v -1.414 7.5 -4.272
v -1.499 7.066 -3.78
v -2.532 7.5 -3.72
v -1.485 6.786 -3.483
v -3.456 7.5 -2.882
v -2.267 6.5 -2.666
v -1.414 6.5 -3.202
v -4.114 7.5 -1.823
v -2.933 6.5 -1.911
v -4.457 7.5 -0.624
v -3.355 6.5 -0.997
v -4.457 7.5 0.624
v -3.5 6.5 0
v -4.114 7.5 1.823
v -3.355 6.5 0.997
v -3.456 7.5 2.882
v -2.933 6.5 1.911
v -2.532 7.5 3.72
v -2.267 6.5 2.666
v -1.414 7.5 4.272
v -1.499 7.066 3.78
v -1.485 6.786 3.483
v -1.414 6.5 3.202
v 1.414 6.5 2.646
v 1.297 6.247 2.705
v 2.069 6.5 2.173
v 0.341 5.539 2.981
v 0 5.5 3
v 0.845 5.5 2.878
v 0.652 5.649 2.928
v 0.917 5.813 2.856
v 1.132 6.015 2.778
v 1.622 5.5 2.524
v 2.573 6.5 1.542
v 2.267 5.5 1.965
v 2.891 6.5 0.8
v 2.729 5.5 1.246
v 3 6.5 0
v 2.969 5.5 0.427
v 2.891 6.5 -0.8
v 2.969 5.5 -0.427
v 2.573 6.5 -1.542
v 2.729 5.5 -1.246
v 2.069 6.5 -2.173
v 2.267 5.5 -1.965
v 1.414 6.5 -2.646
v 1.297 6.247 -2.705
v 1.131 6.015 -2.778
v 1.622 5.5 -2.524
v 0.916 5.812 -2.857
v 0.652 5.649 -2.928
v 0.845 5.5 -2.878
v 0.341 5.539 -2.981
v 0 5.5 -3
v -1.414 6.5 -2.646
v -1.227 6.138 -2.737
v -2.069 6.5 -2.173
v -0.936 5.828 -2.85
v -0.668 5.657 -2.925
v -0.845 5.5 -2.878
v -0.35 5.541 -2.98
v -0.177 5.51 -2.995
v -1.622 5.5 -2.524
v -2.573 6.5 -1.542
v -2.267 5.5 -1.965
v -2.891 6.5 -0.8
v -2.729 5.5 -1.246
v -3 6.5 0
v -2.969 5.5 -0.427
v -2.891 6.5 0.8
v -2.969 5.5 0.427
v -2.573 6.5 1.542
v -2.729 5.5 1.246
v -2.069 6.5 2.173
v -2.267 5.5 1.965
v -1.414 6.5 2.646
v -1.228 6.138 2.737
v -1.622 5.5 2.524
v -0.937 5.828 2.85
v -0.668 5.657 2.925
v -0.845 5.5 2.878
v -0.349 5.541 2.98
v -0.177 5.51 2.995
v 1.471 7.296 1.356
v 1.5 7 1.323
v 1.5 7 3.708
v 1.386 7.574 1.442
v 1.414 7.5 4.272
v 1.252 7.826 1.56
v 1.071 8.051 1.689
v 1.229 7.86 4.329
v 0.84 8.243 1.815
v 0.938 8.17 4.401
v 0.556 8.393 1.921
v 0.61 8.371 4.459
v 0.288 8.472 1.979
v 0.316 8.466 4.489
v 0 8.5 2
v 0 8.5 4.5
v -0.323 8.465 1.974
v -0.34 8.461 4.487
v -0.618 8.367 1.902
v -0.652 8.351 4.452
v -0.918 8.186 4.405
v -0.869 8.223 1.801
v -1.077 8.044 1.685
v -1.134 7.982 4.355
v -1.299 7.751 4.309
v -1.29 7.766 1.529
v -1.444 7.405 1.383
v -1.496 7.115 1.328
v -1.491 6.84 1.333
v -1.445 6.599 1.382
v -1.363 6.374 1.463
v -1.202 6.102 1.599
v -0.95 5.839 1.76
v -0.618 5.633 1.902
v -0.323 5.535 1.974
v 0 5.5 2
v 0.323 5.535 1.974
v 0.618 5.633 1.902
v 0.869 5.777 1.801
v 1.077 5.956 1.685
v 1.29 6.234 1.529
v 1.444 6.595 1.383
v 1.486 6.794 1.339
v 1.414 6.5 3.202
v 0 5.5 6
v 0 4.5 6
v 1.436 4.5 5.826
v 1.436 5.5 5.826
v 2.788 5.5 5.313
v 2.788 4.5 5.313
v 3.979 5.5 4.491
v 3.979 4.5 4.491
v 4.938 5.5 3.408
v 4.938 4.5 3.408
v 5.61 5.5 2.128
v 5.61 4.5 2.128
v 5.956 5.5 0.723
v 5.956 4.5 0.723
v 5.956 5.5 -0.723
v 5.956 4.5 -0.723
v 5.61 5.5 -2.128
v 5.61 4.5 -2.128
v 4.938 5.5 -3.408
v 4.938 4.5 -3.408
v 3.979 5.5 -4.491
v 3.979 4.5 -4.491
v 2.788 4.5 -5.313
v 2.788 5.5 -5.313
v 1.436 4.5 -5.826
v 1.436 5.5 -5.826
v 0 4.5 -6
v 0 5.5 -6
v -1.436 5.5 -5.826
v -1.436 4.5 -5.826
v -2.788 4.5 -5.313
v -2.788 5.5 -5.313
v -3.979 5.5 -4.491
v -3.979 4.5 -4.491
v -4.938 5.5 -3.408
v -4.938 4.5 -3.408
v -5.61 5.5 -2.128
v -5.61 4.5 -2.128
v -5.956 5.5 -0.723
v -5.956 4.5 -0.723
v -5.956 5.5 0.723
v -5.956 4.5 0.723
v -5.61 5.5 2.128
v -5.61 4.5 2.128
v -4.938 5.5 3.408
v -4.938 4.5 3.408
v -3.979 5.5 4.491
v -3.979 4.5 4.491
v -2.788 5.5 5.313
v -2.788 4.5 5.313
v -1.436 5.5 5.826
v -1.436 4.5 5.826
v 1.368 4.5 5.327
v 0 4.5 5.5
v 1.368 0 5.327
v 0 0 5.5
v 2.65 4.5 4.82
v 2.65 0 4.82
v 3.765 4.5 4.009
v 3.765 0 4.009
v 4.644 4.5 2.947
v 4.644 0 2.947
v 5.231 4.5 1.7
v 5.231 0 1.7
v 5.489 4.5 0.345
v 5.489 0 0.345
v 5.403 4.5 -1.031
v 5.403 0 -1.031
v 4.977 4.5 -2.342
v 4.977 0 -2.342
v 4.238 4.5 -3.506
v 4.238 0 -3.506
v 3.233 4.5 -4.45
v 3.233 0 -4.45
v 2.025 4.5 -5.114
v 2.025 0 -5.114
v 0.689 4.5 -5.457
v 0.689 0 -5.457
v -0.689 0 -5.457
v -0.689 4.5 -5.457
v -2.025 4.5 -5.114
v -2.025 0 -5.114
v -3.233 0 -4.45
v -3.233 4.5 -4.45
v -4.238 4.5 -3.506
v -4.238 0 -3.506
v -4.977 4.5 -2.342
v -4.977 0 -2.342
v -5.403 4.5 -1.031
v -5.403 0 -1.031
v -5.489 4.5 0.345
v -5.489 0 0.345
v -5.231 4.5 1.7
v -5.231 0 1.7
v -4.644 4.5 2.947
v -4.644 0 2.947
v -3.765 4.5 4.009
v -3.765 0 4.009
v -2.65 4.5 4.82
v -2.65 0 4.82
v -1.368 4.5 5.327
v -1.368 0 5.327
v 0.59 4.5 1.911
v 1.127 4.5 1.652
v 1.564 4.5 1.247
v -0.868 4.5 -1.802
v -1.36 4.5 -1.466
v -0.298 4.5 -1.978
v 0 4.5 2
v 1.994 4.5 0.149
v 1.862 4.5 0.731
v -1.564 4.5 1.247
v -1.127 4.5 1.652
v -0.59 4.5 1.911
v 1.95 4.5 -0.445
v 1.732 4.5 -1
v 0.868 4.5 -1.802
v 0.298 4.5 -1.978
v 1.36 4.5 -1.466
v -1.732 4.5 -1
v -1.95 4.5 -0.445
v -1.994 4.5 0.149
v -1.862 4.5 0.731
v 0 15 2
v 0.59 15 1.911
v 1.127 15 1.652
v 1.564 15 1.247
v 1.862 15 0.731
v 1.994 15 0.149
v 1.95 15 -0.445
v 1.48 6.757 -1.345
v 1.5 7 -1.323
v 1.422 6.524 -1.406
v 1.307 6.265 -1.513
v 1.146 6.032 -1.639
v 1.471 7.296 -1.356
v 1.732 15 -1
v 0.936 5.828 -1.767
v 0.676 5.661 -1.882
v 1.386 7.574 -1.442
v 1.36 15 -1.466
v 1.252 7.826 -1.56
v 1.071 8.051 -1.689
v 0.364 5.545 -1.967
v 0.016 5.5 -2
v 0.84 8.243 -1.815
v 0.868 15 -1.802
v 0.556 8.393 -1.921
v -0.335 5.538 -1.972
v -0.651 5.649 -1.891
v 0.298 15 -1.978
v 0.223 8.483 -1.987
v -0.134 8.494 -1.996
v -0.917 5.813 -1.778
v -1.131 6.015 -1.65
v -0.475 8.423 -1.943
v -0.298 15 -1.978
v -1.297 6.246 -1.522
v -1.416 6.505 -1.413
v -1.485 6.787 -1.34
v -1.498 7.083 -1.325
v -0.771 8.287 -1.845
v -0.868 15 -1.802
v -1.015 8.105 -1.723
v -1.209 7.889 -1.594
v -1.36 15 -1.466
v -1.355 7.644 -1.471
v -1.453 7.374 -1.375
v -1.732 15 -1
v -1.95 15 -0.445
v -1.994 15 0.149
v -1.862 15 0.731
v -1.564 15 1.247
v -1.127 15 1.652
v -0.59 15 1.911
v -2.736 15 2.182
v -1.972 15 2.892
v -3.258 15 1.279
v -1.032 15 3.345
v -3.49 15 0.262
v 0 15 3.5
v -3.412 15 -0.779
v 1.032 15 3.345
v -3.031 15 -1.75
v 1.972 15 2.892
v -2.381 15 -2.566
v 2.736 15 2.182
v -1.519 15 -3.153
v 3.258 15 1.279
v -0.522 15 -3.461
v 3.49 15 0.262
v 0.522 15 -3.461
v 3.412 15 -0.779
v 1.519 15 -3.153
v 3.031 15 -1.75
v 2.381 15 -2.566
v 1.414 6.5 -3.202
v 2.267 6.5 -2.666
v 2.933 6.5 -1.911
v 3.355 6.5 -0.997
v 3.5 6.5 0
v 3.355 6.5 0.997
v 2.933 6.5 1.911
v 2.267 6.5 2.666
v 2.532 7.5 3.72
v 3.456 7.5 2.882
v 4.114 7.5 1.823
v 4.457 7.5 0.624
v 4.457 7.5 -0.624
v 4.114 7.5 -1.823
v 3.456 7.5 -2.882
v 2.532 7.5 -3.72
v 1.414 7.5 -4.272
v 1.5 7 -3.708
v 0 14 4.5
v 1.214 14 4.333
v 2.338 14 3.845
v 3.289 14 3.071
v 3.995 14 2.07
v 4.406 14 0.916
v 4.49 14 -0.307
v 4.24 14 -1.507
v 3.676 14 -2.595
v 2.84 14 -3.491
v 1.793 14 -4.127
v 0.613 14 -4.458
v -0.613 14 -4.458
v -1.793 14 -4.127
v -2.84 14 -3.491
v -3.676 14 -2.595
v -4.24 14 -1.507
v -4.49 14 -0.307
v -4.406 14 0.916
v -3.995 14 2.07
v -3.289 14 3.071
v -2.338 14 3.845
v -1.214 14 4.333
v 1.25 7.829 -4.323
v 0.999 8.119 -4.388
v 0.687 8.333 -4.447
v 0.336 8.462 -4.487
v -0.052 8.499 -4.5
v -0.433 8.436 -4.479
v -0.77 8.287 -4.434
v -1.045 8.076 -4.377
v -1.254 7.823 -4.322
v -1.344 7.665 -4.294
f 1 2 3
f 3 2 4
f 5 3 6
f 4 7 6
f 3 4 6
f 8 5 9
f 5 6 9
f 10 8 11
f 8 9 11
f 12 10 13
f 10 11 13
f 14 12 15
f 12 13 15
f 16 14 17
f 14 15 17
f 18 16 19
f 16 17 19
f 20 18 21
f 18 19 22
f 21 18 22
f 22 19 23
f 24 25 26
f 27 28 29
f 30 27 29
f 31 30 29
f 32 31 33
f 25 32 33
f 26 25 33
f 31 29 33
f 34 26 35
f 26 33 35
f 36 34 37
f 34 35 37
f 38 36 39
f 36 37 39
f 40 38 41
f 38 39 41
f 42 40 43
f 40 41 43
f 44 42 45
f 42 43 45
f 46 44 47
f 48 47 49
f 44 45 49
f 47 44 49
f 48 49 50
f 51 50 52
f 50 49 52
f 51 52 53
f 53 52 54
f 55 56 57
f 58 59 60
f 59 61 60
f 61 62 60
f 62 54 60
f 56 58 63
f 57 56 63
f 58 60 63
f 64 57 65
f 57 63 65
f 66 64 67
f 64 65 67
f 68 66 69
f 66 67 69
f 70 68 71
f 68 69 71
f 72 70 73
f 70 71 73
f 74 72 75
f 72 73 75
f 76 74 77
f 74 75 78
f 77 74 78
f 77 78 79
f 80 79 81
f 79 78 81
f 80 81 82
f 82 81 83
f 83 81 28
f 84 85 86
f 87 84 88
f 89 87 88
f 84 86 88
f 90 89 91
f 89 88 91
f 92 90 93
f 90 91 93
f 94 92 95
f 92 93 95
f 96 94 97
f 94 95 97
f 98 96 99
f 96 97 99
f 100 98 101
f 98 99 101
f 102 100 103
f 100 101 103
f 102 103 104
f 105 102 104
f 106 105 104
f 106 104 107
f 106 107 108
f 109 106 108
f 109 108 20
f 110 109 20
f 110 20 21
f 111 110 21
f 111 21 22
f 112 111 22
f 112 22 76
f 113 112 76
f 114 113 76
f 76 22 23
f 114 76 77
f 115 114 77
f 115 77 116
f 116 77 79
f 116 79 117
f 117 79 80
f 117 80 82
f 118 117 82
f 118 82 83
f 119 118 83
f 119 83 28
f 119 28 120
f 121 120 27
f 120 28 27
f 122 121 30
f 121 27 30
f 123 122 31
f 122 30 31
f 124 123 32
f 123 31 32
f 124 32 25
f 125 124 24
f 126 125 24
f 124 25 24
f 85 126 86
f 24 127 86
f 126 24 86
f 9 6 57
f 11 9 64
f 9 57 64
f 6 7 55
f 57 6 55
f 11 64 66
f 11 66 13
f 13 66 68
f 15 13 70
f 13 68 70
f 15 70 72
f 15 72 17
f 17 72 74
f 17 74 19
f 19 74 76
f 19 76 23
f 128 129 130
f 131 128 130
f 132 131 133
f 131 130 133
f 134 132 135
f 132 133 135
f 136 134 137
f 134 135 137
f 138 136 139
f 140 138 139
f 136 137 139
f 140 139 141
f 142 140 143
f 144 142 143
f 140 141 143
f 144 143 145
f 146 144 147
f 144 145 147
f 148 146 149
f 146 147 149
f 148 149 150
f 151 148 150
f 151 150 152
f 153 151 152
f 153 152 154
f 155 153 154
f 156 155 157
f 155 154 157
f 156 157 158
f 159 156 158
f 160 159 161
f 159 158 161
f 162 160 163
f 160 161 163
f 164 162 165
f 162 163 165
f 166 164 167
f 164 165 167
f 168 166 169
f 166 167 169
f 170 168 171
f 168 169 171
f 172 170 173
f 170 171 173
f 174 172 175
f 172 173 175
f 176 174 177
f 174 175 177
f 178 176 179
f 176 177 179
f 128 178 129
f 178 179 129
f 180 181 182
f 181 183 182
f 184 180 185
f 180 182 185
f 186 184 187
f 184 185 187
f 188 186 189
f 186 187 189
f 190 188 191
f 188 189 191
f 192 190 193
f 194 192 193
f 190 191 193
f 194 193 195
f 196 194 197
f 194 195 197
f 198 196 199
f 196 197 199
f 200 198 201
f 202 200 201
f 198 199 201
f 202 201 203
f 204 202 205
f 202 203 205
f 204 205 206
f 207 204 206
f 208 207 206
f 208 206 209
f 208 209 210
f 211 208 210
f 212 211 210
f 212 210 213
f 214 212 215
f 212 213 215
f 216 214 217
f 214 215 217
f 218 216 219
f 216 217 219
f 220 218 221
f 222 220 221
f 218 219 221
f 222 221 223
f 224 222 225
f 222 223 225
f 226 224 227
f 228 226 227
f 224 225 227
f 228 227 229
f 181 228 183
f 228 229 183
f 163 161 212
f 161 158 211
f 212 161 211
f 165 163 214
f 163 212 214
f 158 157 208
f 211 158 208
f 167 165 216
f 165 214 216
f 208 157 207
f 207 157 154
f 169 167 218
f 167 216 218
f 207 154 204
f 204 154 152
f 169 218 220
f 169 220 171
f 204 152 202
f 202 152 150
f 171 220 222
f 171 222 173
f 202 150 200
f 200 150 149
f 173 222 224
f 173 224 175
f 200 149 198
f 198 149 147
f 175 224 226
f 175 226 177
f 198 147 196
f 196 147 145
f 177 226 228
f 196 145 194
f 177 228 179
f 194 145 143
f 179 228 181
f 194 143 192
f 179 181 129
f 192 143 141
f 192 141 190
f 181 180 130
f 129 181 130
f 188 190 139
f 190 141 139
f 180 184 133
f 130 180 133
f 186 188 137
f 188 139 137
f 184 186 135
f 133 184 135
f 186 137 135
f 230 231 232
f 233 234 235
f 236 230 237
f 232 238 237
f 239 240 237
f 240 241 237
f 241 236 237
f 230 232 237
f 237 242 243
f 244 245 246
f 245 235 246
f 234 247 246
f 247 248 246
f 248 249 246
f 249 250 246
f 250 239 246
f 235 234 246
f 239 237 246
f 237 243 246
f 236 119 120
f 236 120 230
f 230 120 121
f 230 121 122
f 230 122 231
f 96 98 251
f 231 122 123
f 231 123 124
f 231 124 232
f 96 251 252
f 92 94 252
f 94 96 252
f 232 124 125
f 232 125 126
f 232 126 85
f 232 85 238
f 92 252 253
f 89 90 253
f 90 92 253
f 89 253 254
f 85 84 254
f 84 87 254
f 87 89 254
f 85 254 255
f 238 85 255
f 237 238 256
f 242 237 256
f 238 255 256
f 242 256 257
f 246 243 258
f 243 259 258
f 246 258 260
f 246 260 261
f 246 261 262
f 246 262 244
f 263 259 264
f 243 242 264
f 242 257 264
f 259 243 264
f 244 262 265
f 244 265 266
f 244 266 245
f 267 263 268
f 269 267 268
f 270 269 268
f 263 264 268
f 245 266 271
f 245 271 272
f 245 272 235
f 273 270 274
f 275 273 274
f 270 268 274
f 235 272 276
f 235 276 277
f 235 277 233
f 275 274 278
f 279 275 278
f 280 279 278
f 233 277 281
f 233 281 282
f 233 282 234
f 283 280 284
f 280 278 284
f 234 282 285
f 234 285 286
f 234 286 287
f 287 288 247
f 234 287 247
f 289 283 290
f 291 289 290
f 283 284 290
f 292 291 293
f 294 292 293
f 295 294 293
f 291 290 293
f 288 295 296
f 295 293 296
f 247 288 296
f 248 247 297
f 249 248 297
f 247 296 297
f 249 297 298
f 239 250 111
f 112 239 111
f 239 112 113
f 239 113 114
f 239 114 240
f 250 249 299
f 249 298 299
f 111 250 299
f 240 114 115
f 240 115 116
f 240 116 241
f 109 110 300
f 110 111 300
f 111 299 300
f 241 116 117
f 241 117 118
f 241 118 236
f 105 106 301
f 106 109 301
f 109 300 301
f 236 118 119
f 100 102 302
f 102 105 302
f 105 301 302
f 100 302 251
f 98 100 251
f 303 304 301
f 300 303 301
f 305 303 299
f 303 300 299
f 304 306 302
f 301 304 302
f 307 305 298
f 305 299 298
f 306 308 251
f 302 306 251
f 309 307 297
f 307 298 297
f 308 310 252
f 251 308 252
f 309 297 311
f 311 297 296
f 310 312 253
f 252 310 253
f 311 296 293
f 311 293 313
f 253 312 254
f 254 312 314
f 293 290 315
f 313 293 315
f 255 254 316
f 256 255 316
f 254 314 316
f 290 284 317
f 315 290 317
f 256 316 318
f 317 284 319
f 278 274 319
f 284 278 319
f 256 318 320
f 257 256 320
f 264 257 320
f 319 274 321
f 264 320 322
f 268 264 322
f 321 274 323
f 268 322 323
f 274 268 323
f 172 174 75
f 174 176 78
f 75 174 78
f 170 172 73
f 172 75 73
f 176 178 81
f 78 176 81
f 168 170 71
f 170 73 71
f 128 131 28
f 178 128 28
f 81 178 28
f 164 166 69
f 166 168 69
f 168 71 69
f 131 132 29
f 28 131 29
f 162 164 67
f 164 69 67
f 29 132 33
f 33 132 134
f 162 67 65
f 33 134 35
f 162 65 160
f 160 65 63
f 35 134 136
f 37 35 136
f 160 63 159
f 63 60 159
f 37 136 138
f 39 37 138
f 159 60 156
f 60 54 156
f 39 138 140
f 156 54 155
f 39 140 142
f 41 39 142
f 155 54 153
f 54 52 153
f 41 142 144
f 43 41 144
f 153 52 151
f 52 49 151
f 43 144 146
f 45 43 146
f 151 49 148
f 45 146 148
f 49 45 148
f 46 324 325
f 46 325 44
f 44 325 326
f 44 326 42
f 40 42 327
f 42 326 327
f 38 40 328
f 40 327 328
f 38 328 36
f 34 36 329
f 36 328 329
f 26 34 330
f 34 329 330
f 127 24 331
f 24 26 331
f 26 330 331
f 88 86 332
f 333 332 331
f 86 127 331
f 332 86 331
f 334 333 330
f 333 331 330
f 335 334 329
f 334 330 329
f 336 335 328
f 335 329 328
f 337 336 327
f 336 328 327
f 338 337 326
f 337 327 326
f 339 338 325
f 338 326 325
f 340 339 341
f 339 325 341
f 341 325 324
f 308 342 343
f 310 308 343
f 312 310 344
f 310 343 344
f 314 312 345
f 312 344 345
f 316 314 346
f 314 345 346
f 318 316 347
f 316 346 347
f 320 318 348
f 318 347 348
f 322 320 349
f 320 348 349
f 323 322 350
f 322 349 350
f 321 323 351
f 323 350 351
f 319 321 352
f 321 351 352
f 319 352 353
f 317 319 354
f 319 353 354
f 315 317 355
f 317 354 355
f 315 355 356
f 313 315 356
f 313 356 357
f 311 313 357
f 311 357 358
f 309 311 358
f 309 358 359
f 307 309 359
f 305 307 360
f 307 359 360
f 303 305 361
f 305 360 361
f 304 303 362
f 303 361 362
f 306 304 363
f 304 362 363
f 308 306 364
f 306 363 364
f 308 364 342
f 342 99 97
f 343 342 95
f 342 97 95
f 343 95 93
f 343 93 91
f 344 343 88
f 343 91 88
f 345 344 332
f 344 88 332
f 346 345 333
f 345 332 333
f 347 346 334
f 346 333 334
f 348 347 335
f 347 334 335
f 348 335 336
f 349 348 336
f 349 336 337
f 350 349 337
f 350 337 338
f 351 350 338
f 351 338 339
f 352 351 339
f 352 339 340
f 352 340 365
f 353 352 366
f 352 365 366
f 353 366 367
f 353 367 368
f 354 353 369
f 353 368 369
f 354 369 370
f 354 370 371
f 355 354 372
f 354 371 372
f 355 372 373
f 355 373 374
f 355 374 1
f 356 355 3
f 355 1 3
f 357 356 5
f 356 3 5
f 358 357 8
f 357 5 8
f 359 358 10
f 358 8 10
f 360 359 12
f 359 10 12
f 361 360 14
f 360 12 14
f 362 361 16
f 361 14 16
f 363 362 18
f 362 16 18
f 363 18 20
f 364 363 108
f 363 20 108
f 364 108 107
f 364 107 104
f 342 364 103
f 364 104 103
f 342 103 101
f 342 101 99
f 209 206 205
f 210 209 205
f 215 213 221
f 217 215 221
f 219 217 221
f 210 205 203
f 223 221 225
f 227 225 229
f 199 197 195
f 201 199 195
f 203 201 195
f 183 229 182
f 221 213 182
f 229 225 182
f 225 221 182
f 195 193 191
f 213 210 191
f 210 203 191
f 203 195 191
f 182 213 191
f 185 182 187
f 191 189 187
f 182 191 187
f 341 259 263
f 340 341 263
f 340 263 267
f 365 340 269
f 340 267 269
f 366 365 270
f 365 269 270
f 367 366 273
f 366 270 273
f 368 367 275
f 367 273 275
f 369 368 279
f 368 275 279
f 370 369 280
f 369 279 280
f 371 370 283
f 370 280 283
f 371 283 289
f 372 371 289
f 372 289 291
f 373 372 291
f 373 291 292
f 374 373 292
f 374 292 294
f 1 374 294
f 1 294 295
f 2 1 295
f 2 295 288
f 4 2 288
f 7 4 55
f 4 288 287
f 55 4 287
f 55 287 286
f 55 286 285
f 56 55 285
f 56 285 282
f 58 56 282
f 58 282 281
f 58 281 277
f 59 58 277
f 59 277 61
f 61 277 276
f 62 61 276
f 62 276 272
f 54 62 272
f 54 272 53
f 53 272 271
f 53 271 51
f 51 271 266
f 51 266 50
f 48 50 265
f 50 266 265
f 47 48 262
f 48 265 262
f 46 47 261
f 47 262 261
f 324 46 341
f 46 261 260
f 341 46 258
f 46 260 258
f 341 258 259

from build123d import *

# Parameters (mm, degrees)
F2_SIZE  = 1
F3_R     = 1.5
F4_DEPTH = 25


with BuildPart() as f1:
    # F0 (on Right) → F1 (revolve)
    with BuildSketch(Plane.YZ):
        Polygon((4.5, 5.5), (0, 5.5), (0, 0), (4.5, 0), (4.5, 2), (15, 2), (15, 4.5), (6.5, 4.5), (6.5, 3), (5.5, 3), (5.5, 6), (4.5, 6), align=None)
    revolve(axis=Axis((0, 8.7408488616, 0), (0, 1, 0)))

    # F2
    f2_edges = [f1.edges().sort_by_distance(p)[0] for p in [
        (0, 15, -4.5),
        (0, 6.5, -4.5),
    ]]
    chamfer(f2_edges, length=F2_SIZE)

    # F3 (on Top) → F4 (cut, symmetric)
    with BuildSketch(Plane.XY):
        with Locations((0, 7)):
            Circle(F3_R)
    extrude(amount=F4_DEPTH, both=True, mode=Mode.SUBTRACT)


solid = f1.part
